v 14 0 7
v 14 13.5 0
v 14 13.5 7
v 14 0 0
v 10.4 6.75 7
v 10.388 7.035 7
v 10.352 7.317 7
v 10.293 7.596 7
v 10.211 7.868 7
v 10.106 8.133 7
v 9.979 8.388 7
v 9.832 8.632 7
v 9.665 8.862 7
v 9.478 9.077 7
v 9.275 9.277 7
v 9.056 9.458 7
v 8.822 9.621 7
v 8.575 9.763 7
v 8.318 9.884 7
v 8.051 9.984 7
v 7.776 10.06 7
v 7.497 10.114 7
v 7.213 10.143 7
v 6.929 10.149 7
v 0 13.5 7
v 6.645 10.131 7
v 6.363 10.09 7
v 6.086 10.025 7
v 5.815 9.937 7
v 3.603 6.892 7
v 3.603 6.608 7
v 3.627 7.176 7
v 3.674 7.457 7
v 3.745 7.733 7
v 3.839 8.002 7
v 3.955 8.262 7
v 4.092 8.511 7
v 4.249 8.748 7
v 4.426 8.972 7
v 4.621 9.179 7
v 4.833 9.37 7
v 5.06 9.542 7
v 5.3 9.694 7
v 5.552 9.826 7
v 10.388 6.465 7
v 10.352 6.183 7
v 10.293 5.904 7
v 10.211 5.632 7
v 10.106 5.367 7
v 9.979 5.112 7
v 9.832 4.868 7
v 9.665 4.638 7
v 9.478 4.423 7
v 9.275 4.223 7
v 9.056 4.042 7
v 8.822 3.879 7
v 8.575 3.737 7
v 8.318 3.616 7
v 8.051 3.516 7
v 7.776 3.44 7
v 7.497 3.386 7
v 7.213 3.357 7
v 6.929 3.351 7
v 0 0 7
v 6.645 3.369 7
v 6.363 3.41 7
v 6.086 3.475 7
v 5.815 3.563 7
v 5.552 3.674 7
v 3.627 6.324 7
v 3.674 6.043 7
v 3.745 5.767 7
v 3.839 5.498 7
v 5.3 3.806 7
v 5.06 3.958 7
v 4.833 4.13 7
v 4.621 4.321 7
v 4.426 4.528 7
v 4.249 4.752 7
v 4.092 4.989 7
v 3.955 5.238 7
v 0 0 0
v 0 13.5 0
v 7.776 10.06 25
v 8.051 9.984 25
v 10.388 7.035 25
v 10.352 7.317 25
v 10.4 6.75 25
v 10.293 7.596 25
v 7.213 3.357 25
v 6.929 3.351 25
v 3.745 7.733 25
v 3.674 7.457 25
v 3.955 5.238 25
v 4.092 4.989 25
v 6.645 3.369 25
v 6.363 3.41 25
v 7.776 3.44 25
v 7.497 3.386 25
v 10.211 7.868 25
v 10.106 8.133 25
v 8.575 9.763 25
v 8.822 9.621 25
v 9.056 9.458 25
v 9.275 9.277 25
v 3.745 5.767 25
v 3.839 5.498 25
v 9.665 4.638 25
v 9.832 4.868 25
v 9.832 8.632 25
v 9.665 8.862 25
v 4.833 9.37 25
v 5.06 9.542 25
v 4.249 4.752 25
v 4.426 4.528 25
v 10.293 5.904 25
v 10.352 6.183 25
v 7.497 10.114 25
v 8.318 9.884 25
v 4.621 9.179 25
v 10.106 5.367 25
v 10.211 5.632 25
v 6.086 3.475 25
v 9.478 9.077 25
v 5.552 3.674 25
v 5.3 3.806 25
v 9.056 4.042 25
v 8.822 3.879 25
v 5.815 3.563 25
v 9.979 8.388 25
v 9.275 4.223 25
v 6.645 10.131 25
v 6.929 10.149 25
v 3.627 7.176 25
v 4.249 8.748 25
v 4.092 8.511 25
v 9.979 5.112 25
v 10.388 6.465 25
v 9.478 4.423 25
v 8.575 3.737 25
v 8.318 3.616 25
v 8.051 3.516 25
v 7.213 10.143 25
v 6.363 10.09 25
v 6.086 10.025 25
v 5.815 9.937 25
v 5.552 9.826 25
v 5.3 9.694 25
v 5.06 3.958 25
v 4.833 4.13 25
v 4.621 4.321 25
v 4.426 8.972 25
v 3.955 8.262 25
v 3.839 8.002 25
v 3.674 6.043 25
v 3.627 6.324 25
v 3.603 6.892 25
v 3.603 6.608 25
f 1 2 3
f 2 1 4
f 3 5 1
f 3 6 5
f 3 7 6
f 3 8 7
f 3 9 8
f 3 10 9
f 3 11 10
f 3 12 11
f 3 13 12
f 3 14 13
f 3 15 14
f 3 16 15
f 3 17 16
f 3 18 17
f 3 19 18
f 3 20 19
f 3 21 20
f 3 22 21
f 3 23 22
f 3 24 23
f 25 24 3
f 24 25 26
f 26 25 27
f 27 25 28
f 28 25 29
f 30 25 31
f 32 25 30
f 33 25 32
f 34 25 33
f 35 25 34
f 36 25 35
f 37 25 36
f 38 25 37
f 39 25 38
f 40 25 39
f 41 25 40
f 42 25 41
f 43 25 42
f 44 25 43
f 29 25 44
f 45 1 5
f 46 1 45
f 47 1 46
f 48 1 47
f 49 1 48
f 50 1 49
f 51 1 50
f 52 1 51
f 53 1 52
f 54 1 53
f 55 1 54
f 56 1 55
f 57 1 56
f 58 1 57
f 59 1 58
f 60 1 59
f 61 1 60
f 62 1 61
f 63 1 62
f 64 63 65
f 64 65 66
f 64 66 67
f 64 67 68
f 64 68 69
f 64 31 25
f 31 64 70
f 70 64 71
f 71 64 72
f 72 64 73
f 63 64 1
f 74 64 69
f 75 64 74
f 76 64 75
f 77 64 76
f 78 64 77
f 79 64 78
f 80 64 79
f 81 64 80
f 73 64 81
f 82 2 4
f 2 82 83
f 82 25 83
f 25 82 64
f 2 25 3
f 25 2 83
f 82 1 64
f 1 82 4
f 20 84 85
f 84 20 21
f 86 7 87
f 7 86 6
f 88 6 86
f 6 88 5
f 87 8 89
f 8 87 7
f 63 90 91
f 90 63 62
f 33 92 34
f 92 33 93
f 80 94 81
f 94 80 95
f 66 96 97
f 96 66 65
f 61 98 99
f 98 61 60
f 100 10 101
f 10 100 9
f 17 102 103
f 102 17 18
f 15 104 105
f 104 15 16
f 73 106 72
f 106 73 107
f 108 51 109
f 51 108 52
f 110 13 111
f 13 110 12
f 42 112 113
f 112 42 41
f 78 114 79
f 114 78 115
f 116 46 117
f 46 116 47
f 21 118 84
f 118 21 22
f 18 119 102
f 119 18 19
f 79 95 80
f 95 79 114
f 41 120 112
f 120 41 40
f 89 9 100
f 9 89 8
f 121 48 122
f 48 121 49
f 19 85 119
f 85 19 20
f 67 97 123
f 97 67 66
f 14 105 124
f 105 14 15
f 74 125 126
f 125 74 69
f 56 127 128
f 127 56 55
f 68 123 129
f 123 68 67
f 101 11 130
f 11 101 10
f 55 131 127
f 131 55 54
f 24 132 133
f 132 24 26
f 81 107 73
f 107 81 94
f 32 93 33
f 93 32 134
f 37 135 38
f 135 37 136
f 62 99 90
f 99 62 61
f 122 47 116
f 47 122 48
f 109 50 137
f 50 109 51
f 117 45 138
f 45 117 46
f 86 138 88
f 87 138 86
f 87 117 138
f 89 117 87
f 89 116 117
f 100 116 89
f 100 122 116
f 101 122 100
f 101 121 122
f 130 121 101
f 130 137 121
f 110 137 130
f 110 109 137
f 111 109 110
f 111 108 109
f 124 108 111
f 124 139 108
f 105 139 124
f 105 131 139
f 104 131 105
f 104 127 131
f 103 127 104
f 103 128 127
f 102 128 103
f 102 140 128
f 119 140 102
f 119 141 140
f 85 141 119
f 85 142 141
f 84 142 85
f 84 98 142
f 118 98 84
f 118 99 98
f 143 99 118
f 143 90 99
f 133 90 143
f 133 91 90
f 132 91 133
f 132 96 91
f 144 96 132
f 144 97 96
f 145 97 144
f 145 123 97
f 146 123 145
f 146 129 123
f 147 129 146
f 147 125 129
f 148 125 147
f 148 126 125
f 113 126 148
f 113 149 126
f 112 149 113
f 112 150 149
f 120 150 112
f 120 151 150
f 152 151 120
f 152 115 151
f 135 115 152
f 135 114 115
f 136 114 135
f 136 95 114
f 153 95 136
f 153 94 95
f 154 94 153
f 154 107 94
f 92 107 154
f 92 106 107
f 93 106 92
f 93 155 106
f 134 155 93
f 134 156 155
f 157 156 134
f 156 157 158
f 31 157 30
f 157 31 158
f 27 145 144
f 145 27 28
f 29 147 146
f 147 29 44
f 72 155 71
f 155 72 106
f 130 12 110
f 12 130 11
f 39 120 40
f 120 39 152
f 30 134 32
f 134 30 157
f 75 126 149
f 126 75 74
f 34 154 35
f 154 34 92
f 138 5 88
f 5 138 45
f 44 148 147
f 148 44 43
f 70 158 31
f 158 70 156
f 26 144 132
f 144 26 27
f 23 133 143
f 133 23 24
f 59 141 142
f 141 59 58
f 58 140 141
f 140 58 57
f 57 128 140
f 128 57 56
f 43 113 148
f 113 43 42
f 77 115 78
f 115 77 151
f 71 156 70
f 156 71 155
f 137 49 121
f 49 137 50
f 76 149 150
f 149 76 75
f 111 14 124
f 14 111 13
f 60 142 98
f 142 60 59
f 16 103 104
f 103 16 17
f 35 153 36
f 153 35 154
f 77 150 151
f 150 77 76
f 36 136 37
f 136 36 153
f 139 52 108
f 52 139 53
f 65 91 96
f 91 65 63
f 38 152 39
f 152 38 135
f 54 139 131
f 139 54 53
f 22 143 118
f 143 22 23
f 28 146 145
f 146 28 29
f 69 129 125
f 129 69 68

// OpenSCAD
$fn=75;

// LED: 2x3,45 / Pad: 20x21,5
module led(){
    color("blue")
    union(){
        cube([20,21.5,2]);
        translate([8.275,9.025,2]){
            cube([3.45,3.45,2]);
        }
    }
}

// Radiateur: 51x51,5x10
module radiateur(){
    color("purple") cube([51,51.5,10]);
}

// Ventilo: 30x30x10
module ventilateur(){
    union(){
    difference(){
        color("black") cube([40,40,10]);
        // Trous vis
        translate([4,4,-1]) cylinder(15,2,2);
        translate([40-4,4,-1]) cylinder(15,2,2);
        translate([4,40-4,-1]) cylinder(15,2,2);
        translate([40-4,40-4,-1]) cylinder(15,2,2);
    }
    // Centre
    translate([40/2,40/2,9]) color("lightgray") cylinder(2,1,1);
    }
}

module ledRadiateur(){
    radiateur();
    translate([25.5-10,25.75-10.5,10]){
        led();
    }
}

// Breadbord pour arduino (avec Arduino)
module bBoard(){
    /*
    // Big bBoard Cédric
    cube([125,57,9.8]);
    // Arduino
    translate([0,57/2-9,9.8]){
        cube([45,18,6]);
    }*/
    
    // bBoard 30 pins
    cube([85,57,9.8]);
    // Arduino
    translate([0,57/2-9,9.8]){
        cube([45,18,6]);
    }
}

// Modules d'alim Arduino + contôle ventilo
module moteurs(){
    difference(){
        cube([43.5,43.5,27]);
        // Trous vis
        translate([43.5-1.9-2,1.9+2,-1]) cylinder(30,2,2);
        translate([1.9+2,43.5-1.9-2,-1]) cylinder(30,2,2);
        translate([1.9+2,1.9+2,-1]) cylinder(30,2,2);
        translate([43.5-1.9-2,43.5-1.9-2,-1]) cylinder(30,2,2);
    }
}

// Abaisseur tension LED
module abaisseur(){
    difference(){
        cube([23,48,12.5]);
        // Trous vis
        translate([1.6+1,6+1,-1]) cylinder(15,2,2);
        translate([23-1.6-1,48-6-1,-1]) cylinder(15,2,2);
    }
}

module driverLed(){
    
}

module encodeur(){
    union(){
        // Bas
        cube([14,13.5,7]);
        // Haut
        translate([7,6.75,7]){
            cylinder(18,3.4,3.4);
        }
    }
}

module ecran(){
    difference(){
        union(){
            color("purple") cube([63.11,37.83,6.3]);
            translate([63.27/2-51.12/2,37.59/2-34.87/2,6.3]){
                color("green") cube([51.12,34.87,2]);
            }
        }
        // Trous vis
        translate([0.9+1.2,1.2+1.2,-1]){
            cylinder(10,1.2,1.2);
        }
        translate([63.27-0.9-1.2,1.2+1.2,-1]){
            cylinder(10,1.2,1.2);
        }
        translate([63.27-0.9-1.2,37.83-1.2-1.2,-1]){
            cylinder(10,1.2,1.2);
        }
        translate([0.9+1.2,37.83-1.2-1.2,-1]){
            cylinder(10,1.2,1.2);
        }
    }
}

/*ventilateur();
translate([-25.5+15,-25.75+15,15]){
    ledRadiateur();
}*/

//ventilateur();
//moteurs();
//ecran();
encodeur();

//bBoard();
